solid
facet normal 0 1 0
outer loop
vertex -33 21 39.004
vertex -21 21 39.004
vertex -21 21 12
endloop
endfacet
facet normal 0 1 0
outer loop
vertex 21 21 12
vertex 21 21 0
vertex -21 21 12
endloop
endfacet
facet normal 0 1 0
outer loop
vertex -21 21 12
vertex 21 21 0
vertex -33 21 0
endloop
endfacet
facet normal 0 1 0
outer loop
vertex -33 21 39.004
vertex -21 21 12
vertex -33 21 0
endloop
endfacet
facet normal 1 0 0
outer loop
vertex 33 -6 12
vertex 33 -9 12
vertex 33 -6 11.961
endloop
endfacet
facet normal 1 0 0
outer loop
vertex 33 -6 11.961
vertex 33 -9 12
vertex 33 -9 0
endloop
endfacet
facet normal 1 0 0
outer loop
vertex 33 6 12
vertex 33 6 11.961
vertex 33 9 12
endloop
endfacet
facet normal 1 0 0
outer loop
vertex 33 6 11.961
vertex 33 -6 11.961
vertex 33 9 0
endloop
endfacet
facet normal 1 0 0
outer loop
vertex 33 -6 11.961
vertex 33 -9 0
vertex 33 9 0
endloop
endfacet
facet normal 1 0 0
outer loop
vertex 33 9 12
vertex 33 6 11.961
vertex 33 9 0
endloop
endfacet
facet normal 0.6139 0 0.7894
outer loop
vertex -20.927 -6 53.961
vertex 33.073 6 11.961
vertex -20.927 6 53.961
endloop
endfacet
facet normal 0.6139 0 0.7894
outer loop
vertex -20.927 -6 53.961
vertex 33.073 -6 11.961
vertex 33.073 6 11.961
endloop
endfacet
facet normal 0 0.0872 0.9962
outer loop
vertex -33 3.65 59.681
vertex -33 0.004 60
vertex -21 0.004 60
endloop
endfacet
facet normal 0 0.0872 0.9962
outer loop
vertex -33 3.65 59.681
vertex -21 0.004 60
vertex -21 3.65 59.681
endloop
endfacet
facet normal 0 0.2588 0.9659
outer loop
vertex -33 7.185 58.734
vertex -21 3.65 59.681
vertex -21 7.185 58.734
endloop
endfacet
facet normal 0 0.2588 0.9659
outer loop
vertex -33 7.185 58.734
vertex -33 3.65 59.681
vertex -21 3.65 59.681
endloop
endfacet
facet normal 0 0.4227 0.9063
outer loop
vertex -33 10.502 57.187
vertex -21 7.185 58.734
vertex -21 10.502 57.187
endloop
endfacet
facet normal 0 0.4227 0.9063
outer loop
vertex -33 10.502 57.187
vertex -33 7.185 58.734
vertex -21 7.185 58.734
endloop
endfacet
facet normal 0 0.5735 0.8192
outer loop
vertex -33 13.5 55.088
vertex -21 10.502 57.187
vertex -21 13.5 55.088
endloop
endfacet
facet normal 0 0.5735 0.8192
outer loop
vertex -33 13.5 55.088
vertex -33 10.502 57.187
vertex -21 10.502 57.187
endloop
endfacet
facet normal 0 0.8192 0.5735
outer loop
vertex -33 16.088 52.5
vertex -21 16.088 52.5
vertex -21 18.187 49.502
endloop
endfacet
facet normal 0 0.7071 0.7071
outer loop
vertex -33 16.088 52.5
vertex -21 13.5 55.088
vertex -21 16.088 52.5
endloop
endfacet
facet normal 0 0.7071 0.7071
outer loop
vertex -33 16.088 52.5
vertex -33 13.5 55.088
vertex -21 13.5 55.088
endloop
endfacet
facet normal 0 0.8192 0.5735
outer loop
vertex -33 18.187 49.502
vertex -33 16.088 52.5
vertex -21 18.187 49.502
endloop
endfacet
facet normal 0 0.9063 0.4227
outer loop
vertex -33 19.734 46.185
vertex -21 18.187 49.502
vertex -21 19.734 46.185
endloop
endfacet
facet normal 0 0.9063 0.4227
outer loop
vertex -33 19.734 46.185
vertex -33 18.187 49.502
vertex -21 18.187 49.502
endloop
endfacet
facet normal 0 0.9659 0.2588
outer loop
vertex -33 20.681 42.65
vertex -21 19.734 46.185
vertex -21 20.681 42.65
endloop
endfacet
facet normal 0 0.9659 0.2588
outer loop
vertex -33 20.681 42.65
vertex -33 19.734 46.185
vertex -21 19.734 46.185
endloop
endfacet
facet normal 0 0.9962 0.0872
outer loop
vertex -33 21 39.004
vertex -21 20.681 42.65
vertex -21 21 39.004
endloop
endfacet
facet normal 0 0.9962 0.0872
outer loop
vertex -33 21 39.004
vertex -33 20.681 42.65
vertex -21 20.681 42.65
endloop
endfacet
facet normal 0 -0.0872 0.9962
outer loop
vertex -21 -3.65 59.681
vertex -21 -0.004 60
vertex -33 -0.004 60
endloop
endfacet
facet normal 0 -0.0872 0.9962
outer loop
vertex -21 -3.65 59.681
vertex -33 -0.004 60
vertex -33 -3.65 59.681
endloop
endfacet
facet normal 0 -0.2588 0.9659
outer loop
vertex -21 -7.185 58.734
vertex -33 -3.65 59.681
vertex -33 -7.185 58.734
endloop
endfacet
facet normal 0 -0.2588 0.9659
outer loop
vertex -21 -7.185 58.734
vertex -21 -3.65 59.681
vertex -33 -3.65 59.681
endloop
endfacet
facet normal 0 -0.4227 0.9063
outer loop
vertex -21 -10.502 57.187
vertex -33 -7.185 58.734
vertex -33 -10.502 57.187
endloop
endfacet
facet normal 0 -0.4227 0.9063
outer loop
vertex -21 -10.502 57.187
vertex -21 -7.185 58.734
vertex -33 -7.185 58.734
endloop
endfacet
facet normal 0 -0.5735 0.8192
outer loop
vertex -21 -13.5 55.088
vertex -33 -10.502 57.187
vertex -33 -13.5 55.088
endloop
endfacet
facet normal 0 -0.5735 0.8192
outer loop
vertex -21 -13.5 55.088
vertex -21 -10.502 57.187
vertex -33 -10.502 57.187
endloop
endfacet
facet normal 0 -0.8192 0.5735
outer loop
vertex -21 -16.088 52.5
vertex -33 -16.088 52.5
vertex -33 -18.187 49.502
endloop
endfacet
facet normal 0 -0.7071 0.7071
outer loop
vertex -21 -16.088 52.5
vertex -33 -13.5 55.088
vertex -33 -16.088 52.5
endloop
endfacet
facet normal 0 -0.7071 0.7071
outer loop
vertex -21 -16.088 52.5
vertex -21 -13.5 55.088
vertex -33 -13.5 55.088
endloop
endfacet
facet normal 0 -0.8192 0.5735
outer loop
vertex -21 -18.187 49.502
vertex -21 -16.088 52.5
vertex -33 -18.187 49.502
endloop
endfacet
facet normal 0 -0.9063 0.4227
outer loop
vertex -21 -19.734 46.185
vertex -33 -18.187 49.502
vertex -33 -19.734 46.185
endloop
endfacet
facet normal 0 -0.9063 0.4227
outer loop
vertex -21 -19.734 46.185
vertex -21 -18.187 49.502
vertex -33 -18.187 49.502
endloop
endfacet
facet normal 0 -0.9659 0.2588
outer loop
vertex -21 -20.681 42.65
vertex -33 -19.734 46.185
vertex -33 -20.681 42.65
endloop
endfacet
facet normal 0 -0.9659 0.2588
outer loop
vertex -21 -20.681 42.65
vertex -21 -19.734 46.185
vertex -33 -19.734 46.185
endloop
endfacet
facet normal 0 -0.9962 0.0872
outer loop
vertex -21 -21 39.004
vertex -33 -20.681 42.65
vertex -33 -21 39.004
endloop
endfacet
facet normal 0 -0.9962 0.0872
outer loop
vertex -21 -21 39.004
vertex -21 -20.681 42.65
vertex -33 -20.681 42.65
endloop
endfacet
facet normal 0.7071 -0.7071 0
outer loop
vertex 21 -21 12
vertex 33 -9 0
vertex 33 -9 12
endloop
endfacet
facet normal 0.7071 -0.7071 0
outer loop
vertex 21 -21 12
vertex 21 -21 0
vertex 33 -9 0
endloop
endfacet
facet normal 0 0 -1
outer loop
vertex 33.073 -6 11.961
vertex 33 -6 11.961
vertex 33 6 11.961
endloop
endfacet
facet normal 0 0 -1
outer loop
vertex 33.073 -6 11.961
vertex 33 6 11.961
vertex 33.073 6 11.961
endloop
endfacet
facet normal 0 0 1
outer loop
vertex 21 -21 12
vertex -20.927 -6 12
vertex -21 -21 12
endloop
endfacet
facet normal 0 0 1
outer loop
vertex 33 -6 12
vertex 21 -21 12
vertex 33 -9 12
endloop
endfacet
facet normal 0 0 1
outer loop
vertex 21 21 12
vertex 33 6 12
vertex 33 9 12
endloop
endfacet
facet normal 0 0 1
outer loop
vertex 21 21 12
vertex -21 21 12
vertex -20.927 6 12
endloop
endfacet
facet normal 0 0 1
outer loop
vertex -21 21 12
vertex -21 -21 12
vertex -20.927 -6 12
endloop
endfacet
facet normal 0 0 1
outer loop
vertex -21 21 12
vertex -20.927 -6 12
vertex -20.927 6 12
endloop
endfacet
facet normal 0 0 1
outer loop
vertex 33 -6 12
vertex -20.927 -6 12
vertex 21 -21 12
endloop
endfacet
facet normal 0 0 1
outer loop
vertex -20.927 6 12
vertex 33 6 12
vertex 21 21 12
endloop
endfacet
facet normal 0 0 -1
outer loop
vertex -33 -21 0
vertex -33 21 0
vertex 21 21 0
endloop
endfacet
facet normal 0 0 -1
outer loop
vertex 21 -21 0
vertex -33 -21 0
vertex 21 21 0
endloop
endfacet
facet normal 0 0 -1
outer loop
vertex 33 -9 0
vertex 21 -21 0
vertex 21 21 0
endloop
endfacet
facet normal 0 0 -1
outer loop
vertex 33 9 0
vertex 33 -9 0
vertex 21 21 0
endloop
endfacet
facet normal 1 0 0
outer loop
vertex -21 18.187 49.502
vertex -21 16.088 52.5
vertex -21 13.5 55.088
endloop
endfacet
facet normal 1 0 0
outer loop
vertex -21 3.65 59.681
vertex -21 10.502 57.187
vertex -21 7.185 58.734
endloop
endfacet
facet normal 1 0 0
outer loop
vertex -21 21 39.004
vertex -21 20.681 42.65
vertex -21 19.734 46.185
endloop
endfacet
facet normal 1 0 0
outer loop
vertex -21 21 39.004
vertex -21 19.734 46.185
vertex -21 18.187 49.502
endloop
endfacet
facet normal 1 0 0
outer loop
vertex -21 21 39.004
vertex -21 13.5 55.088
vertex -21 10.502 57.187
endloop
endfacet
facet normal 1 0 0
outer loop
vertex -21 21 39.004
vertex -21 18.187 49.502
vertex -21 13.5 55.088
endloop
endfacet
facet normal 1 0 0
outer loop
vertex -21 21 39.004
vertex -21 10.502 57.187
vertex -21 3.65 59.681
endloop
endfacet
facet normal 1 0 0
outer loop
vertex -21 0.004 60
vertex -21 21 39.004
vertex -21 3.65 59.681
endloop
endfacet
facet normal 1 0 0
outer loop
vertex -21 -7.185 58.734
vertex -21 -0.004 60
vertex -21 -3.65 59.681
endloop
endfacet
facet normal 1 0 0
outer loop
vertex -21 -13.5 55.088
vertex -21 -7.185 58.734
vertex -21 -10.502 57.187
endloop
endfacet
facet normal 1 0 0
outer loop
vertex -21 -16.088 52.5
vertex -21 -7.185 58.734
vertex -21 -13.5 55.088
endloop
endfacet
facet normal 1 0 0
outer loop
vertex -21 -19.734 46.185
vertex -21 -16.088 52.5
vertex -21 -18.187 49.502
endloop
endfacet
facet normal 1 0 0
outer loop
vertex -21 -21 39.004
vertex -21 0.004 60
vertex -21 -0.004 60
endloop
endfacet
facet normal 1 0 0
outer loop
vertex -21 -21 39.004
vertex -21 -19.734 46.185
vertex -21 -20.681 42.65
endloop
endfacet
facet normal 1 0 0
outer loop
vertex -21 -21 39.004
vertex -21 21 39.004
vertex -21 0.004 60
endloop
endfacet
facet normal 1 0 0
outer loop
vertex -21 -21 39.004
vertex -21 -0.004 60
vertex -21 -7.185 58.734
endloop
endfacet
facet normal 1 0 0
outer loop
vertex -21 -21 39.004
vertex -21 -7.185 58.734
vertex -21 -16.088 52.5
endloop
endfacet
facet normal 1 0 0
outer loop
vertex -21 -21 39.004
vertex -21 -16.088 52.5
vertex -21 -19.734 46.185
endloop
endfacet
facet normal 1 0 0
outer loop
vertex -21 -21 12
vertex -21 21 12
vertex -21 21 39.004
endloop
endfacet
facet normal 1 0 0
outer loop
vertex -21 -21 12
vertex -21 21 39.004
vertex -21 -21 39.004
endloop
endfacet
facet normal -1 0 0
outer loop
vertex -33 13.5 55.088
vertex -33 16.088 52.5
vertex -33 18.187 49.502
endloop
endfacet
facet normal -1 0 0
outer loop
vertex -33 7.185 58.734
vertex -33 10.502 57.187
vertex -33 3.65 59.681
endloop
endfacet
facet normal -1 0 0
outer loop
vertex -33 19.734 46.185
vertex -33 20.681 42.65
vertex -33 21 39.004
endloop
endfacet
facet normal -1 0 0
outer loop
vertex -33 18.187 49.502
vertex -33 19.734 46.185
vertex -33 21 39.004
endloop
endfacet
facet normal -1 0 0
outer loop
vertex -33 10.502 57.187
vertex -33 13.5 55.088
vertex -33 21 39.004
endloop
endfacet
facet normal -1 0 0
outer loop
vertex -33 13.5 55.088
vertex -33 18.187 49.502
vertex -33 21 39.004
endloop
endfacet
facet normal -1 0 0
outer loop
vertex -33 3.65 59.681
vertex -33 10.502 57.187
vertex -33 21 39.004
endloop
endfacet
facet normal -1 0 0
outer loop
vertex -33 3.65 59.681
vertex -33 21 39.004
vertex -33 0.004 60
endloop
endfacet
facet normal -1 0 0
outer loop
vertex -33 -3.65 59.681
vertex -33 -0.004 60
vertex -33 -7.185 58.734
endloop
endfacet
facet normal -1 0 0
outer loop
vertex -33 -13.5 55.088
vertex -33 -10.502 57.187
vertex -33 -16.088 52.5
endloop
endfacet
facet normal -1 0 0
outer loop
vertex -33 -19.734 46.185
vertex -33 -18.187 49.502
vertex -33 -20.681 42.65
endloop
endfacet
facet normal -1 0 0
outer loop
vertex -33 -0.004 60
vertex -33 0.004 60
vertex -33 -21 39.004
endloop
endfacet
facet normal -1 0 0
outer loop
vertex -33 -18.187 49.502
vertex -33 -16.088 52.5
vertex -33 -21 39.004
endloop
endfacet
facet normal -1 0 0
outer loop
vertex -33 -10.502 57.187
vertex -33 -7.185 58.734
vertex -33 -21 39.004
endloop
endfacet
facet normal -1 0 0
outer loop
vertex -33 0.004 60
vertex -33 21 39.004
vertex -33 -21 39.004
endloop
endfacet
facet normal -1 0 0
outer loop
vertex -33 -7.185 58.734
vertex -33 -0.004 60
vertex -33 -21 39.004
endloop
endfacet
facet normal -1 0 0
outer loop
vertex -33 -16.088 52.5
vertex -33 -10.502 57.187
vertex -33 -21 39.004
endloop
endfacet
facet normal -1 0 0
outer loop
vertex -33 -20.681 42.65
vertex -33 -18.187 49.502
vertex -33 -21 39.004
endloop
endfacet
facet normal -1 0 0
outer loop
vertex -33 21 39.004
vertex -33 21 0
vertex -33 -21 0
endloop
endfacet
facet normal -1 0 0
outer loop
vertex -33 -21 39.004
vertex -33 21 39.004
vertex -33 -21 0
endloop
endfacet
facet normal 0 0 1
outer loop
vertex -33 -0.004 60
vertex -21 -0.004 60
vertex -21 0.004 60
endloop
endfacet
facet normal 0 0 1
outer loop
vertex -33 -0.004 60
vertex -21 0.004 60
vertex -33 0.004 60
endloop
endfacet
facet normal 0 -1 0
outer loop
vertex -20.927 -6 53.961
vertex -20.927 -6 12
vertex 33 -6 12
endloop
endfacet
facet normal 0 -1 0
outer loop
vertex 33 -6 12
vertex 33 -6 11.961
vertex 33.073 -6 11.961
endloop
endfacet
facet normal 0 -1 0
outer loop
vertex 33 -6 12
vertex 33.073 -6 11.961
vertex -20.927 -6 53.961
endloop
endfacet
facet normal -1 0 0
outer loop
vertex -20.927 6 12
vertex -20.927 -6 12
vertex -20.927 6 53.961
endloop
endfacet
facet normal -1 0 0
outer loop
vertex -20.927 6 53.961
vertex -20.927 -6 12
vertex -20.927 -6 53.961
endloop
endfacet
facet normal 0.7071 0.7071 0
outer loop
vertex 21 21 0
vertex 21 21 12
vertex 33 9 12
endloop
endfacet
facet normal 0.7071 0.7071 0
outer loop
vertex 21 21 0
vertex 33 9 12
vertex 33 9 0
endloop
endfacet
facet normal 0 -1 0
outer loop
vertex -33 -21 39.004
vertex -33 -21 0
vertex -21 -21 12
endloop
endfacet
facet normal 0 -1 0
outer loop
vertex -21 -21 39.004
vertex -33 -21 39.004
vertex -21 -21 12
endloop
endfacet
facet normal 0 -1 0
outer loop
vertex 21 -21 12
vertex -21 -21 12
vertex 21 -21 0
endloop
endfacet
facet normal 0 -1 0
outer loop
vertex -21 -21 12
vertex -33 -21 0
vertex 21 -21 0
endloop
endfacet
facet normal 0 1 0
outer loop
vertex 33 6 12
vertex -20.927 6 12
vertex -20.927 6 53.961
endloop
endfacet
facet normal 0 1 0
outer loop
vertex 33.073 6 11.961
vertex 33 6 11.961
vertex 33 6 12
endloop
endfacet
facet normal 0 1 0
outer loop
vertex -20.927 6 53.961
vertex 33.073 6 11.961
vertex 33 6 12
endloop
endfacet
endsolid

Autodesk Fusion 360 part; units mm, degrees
sketch "Sketch1" plane through (0, 0, 0) normal (0, 0, 1) x (1, 0, 0)
  line L0 (33, 21) -> (-33, 21)
  line L1 (-33, 21) -> (-33, -21)
  line L2 (-33, -21) -> (33, -21)
  line L3 (33, -21) -> (33, 21)
  line L4 (33, 21) -> (-33, -21) construction
  line L5 (-33, 21) -> (33, -21) construction
  dimension "d1" = 66
  dimension "d2" = 42
extrude "Extrude1" add sketch "Sketch1" along normal blind 12
chamfer "Chamfer1" distance 12 angle 45 2 edges at (33, -21, 6) (33, 21, 6)
sketch "Sketch2" plane through (0, 0, 12) normal (0, 0, 1) x (-1, 0, 0)
  line L0 (-33, -9) -> (-21, -21)
  line L1 (-21, -21) -> (33, -21)
  line L2 (33, -21) -> (33, 21)
  line L3 (33, 21) -> (-21, 21)
  line L4 (-21, 21) -> (-33, 9)
  line L5 (-33, 9) -> (-33, -9)
  line L6 (33, -21) -> (21, -21)
  line L7 (21, -21) -> (21, 21)
  line L8 (21, 21) -> (33, 21)
  line L9 (33, 21) -> (33, -21)
  dimension "d6" = 12
extrude "Extrude2" add sketch "Sketch2" along normal blind 48 contours L1 L2 L3 L6 L7 L8 L9
fillet "Fillet1" radius 21 2 edges at (-27, -21, 60) (-27, 21, 60)
sketch "Sketch3" plane through (0, 0, 0) normal (0, 1, 0) x (1, 0, 0)
  line L0 (-20.9271, -11.9611) -> (-20.9271, -53.9611)
  line L1 (-20.9271, -11.9611) -> (33.0729, -11.9611)
  line L2 (33.0729, -11.9611) -> (-20.9271, -53.9611)
  dimension "d11" = 42
  dimension "d12" = 54
extrude "Extrude3" add sketch "Sketch3" along normal mid plane 12
equation "d7 = 60 mm - 12 mm"
equation "d12 = 66 mm - 12 mm"
